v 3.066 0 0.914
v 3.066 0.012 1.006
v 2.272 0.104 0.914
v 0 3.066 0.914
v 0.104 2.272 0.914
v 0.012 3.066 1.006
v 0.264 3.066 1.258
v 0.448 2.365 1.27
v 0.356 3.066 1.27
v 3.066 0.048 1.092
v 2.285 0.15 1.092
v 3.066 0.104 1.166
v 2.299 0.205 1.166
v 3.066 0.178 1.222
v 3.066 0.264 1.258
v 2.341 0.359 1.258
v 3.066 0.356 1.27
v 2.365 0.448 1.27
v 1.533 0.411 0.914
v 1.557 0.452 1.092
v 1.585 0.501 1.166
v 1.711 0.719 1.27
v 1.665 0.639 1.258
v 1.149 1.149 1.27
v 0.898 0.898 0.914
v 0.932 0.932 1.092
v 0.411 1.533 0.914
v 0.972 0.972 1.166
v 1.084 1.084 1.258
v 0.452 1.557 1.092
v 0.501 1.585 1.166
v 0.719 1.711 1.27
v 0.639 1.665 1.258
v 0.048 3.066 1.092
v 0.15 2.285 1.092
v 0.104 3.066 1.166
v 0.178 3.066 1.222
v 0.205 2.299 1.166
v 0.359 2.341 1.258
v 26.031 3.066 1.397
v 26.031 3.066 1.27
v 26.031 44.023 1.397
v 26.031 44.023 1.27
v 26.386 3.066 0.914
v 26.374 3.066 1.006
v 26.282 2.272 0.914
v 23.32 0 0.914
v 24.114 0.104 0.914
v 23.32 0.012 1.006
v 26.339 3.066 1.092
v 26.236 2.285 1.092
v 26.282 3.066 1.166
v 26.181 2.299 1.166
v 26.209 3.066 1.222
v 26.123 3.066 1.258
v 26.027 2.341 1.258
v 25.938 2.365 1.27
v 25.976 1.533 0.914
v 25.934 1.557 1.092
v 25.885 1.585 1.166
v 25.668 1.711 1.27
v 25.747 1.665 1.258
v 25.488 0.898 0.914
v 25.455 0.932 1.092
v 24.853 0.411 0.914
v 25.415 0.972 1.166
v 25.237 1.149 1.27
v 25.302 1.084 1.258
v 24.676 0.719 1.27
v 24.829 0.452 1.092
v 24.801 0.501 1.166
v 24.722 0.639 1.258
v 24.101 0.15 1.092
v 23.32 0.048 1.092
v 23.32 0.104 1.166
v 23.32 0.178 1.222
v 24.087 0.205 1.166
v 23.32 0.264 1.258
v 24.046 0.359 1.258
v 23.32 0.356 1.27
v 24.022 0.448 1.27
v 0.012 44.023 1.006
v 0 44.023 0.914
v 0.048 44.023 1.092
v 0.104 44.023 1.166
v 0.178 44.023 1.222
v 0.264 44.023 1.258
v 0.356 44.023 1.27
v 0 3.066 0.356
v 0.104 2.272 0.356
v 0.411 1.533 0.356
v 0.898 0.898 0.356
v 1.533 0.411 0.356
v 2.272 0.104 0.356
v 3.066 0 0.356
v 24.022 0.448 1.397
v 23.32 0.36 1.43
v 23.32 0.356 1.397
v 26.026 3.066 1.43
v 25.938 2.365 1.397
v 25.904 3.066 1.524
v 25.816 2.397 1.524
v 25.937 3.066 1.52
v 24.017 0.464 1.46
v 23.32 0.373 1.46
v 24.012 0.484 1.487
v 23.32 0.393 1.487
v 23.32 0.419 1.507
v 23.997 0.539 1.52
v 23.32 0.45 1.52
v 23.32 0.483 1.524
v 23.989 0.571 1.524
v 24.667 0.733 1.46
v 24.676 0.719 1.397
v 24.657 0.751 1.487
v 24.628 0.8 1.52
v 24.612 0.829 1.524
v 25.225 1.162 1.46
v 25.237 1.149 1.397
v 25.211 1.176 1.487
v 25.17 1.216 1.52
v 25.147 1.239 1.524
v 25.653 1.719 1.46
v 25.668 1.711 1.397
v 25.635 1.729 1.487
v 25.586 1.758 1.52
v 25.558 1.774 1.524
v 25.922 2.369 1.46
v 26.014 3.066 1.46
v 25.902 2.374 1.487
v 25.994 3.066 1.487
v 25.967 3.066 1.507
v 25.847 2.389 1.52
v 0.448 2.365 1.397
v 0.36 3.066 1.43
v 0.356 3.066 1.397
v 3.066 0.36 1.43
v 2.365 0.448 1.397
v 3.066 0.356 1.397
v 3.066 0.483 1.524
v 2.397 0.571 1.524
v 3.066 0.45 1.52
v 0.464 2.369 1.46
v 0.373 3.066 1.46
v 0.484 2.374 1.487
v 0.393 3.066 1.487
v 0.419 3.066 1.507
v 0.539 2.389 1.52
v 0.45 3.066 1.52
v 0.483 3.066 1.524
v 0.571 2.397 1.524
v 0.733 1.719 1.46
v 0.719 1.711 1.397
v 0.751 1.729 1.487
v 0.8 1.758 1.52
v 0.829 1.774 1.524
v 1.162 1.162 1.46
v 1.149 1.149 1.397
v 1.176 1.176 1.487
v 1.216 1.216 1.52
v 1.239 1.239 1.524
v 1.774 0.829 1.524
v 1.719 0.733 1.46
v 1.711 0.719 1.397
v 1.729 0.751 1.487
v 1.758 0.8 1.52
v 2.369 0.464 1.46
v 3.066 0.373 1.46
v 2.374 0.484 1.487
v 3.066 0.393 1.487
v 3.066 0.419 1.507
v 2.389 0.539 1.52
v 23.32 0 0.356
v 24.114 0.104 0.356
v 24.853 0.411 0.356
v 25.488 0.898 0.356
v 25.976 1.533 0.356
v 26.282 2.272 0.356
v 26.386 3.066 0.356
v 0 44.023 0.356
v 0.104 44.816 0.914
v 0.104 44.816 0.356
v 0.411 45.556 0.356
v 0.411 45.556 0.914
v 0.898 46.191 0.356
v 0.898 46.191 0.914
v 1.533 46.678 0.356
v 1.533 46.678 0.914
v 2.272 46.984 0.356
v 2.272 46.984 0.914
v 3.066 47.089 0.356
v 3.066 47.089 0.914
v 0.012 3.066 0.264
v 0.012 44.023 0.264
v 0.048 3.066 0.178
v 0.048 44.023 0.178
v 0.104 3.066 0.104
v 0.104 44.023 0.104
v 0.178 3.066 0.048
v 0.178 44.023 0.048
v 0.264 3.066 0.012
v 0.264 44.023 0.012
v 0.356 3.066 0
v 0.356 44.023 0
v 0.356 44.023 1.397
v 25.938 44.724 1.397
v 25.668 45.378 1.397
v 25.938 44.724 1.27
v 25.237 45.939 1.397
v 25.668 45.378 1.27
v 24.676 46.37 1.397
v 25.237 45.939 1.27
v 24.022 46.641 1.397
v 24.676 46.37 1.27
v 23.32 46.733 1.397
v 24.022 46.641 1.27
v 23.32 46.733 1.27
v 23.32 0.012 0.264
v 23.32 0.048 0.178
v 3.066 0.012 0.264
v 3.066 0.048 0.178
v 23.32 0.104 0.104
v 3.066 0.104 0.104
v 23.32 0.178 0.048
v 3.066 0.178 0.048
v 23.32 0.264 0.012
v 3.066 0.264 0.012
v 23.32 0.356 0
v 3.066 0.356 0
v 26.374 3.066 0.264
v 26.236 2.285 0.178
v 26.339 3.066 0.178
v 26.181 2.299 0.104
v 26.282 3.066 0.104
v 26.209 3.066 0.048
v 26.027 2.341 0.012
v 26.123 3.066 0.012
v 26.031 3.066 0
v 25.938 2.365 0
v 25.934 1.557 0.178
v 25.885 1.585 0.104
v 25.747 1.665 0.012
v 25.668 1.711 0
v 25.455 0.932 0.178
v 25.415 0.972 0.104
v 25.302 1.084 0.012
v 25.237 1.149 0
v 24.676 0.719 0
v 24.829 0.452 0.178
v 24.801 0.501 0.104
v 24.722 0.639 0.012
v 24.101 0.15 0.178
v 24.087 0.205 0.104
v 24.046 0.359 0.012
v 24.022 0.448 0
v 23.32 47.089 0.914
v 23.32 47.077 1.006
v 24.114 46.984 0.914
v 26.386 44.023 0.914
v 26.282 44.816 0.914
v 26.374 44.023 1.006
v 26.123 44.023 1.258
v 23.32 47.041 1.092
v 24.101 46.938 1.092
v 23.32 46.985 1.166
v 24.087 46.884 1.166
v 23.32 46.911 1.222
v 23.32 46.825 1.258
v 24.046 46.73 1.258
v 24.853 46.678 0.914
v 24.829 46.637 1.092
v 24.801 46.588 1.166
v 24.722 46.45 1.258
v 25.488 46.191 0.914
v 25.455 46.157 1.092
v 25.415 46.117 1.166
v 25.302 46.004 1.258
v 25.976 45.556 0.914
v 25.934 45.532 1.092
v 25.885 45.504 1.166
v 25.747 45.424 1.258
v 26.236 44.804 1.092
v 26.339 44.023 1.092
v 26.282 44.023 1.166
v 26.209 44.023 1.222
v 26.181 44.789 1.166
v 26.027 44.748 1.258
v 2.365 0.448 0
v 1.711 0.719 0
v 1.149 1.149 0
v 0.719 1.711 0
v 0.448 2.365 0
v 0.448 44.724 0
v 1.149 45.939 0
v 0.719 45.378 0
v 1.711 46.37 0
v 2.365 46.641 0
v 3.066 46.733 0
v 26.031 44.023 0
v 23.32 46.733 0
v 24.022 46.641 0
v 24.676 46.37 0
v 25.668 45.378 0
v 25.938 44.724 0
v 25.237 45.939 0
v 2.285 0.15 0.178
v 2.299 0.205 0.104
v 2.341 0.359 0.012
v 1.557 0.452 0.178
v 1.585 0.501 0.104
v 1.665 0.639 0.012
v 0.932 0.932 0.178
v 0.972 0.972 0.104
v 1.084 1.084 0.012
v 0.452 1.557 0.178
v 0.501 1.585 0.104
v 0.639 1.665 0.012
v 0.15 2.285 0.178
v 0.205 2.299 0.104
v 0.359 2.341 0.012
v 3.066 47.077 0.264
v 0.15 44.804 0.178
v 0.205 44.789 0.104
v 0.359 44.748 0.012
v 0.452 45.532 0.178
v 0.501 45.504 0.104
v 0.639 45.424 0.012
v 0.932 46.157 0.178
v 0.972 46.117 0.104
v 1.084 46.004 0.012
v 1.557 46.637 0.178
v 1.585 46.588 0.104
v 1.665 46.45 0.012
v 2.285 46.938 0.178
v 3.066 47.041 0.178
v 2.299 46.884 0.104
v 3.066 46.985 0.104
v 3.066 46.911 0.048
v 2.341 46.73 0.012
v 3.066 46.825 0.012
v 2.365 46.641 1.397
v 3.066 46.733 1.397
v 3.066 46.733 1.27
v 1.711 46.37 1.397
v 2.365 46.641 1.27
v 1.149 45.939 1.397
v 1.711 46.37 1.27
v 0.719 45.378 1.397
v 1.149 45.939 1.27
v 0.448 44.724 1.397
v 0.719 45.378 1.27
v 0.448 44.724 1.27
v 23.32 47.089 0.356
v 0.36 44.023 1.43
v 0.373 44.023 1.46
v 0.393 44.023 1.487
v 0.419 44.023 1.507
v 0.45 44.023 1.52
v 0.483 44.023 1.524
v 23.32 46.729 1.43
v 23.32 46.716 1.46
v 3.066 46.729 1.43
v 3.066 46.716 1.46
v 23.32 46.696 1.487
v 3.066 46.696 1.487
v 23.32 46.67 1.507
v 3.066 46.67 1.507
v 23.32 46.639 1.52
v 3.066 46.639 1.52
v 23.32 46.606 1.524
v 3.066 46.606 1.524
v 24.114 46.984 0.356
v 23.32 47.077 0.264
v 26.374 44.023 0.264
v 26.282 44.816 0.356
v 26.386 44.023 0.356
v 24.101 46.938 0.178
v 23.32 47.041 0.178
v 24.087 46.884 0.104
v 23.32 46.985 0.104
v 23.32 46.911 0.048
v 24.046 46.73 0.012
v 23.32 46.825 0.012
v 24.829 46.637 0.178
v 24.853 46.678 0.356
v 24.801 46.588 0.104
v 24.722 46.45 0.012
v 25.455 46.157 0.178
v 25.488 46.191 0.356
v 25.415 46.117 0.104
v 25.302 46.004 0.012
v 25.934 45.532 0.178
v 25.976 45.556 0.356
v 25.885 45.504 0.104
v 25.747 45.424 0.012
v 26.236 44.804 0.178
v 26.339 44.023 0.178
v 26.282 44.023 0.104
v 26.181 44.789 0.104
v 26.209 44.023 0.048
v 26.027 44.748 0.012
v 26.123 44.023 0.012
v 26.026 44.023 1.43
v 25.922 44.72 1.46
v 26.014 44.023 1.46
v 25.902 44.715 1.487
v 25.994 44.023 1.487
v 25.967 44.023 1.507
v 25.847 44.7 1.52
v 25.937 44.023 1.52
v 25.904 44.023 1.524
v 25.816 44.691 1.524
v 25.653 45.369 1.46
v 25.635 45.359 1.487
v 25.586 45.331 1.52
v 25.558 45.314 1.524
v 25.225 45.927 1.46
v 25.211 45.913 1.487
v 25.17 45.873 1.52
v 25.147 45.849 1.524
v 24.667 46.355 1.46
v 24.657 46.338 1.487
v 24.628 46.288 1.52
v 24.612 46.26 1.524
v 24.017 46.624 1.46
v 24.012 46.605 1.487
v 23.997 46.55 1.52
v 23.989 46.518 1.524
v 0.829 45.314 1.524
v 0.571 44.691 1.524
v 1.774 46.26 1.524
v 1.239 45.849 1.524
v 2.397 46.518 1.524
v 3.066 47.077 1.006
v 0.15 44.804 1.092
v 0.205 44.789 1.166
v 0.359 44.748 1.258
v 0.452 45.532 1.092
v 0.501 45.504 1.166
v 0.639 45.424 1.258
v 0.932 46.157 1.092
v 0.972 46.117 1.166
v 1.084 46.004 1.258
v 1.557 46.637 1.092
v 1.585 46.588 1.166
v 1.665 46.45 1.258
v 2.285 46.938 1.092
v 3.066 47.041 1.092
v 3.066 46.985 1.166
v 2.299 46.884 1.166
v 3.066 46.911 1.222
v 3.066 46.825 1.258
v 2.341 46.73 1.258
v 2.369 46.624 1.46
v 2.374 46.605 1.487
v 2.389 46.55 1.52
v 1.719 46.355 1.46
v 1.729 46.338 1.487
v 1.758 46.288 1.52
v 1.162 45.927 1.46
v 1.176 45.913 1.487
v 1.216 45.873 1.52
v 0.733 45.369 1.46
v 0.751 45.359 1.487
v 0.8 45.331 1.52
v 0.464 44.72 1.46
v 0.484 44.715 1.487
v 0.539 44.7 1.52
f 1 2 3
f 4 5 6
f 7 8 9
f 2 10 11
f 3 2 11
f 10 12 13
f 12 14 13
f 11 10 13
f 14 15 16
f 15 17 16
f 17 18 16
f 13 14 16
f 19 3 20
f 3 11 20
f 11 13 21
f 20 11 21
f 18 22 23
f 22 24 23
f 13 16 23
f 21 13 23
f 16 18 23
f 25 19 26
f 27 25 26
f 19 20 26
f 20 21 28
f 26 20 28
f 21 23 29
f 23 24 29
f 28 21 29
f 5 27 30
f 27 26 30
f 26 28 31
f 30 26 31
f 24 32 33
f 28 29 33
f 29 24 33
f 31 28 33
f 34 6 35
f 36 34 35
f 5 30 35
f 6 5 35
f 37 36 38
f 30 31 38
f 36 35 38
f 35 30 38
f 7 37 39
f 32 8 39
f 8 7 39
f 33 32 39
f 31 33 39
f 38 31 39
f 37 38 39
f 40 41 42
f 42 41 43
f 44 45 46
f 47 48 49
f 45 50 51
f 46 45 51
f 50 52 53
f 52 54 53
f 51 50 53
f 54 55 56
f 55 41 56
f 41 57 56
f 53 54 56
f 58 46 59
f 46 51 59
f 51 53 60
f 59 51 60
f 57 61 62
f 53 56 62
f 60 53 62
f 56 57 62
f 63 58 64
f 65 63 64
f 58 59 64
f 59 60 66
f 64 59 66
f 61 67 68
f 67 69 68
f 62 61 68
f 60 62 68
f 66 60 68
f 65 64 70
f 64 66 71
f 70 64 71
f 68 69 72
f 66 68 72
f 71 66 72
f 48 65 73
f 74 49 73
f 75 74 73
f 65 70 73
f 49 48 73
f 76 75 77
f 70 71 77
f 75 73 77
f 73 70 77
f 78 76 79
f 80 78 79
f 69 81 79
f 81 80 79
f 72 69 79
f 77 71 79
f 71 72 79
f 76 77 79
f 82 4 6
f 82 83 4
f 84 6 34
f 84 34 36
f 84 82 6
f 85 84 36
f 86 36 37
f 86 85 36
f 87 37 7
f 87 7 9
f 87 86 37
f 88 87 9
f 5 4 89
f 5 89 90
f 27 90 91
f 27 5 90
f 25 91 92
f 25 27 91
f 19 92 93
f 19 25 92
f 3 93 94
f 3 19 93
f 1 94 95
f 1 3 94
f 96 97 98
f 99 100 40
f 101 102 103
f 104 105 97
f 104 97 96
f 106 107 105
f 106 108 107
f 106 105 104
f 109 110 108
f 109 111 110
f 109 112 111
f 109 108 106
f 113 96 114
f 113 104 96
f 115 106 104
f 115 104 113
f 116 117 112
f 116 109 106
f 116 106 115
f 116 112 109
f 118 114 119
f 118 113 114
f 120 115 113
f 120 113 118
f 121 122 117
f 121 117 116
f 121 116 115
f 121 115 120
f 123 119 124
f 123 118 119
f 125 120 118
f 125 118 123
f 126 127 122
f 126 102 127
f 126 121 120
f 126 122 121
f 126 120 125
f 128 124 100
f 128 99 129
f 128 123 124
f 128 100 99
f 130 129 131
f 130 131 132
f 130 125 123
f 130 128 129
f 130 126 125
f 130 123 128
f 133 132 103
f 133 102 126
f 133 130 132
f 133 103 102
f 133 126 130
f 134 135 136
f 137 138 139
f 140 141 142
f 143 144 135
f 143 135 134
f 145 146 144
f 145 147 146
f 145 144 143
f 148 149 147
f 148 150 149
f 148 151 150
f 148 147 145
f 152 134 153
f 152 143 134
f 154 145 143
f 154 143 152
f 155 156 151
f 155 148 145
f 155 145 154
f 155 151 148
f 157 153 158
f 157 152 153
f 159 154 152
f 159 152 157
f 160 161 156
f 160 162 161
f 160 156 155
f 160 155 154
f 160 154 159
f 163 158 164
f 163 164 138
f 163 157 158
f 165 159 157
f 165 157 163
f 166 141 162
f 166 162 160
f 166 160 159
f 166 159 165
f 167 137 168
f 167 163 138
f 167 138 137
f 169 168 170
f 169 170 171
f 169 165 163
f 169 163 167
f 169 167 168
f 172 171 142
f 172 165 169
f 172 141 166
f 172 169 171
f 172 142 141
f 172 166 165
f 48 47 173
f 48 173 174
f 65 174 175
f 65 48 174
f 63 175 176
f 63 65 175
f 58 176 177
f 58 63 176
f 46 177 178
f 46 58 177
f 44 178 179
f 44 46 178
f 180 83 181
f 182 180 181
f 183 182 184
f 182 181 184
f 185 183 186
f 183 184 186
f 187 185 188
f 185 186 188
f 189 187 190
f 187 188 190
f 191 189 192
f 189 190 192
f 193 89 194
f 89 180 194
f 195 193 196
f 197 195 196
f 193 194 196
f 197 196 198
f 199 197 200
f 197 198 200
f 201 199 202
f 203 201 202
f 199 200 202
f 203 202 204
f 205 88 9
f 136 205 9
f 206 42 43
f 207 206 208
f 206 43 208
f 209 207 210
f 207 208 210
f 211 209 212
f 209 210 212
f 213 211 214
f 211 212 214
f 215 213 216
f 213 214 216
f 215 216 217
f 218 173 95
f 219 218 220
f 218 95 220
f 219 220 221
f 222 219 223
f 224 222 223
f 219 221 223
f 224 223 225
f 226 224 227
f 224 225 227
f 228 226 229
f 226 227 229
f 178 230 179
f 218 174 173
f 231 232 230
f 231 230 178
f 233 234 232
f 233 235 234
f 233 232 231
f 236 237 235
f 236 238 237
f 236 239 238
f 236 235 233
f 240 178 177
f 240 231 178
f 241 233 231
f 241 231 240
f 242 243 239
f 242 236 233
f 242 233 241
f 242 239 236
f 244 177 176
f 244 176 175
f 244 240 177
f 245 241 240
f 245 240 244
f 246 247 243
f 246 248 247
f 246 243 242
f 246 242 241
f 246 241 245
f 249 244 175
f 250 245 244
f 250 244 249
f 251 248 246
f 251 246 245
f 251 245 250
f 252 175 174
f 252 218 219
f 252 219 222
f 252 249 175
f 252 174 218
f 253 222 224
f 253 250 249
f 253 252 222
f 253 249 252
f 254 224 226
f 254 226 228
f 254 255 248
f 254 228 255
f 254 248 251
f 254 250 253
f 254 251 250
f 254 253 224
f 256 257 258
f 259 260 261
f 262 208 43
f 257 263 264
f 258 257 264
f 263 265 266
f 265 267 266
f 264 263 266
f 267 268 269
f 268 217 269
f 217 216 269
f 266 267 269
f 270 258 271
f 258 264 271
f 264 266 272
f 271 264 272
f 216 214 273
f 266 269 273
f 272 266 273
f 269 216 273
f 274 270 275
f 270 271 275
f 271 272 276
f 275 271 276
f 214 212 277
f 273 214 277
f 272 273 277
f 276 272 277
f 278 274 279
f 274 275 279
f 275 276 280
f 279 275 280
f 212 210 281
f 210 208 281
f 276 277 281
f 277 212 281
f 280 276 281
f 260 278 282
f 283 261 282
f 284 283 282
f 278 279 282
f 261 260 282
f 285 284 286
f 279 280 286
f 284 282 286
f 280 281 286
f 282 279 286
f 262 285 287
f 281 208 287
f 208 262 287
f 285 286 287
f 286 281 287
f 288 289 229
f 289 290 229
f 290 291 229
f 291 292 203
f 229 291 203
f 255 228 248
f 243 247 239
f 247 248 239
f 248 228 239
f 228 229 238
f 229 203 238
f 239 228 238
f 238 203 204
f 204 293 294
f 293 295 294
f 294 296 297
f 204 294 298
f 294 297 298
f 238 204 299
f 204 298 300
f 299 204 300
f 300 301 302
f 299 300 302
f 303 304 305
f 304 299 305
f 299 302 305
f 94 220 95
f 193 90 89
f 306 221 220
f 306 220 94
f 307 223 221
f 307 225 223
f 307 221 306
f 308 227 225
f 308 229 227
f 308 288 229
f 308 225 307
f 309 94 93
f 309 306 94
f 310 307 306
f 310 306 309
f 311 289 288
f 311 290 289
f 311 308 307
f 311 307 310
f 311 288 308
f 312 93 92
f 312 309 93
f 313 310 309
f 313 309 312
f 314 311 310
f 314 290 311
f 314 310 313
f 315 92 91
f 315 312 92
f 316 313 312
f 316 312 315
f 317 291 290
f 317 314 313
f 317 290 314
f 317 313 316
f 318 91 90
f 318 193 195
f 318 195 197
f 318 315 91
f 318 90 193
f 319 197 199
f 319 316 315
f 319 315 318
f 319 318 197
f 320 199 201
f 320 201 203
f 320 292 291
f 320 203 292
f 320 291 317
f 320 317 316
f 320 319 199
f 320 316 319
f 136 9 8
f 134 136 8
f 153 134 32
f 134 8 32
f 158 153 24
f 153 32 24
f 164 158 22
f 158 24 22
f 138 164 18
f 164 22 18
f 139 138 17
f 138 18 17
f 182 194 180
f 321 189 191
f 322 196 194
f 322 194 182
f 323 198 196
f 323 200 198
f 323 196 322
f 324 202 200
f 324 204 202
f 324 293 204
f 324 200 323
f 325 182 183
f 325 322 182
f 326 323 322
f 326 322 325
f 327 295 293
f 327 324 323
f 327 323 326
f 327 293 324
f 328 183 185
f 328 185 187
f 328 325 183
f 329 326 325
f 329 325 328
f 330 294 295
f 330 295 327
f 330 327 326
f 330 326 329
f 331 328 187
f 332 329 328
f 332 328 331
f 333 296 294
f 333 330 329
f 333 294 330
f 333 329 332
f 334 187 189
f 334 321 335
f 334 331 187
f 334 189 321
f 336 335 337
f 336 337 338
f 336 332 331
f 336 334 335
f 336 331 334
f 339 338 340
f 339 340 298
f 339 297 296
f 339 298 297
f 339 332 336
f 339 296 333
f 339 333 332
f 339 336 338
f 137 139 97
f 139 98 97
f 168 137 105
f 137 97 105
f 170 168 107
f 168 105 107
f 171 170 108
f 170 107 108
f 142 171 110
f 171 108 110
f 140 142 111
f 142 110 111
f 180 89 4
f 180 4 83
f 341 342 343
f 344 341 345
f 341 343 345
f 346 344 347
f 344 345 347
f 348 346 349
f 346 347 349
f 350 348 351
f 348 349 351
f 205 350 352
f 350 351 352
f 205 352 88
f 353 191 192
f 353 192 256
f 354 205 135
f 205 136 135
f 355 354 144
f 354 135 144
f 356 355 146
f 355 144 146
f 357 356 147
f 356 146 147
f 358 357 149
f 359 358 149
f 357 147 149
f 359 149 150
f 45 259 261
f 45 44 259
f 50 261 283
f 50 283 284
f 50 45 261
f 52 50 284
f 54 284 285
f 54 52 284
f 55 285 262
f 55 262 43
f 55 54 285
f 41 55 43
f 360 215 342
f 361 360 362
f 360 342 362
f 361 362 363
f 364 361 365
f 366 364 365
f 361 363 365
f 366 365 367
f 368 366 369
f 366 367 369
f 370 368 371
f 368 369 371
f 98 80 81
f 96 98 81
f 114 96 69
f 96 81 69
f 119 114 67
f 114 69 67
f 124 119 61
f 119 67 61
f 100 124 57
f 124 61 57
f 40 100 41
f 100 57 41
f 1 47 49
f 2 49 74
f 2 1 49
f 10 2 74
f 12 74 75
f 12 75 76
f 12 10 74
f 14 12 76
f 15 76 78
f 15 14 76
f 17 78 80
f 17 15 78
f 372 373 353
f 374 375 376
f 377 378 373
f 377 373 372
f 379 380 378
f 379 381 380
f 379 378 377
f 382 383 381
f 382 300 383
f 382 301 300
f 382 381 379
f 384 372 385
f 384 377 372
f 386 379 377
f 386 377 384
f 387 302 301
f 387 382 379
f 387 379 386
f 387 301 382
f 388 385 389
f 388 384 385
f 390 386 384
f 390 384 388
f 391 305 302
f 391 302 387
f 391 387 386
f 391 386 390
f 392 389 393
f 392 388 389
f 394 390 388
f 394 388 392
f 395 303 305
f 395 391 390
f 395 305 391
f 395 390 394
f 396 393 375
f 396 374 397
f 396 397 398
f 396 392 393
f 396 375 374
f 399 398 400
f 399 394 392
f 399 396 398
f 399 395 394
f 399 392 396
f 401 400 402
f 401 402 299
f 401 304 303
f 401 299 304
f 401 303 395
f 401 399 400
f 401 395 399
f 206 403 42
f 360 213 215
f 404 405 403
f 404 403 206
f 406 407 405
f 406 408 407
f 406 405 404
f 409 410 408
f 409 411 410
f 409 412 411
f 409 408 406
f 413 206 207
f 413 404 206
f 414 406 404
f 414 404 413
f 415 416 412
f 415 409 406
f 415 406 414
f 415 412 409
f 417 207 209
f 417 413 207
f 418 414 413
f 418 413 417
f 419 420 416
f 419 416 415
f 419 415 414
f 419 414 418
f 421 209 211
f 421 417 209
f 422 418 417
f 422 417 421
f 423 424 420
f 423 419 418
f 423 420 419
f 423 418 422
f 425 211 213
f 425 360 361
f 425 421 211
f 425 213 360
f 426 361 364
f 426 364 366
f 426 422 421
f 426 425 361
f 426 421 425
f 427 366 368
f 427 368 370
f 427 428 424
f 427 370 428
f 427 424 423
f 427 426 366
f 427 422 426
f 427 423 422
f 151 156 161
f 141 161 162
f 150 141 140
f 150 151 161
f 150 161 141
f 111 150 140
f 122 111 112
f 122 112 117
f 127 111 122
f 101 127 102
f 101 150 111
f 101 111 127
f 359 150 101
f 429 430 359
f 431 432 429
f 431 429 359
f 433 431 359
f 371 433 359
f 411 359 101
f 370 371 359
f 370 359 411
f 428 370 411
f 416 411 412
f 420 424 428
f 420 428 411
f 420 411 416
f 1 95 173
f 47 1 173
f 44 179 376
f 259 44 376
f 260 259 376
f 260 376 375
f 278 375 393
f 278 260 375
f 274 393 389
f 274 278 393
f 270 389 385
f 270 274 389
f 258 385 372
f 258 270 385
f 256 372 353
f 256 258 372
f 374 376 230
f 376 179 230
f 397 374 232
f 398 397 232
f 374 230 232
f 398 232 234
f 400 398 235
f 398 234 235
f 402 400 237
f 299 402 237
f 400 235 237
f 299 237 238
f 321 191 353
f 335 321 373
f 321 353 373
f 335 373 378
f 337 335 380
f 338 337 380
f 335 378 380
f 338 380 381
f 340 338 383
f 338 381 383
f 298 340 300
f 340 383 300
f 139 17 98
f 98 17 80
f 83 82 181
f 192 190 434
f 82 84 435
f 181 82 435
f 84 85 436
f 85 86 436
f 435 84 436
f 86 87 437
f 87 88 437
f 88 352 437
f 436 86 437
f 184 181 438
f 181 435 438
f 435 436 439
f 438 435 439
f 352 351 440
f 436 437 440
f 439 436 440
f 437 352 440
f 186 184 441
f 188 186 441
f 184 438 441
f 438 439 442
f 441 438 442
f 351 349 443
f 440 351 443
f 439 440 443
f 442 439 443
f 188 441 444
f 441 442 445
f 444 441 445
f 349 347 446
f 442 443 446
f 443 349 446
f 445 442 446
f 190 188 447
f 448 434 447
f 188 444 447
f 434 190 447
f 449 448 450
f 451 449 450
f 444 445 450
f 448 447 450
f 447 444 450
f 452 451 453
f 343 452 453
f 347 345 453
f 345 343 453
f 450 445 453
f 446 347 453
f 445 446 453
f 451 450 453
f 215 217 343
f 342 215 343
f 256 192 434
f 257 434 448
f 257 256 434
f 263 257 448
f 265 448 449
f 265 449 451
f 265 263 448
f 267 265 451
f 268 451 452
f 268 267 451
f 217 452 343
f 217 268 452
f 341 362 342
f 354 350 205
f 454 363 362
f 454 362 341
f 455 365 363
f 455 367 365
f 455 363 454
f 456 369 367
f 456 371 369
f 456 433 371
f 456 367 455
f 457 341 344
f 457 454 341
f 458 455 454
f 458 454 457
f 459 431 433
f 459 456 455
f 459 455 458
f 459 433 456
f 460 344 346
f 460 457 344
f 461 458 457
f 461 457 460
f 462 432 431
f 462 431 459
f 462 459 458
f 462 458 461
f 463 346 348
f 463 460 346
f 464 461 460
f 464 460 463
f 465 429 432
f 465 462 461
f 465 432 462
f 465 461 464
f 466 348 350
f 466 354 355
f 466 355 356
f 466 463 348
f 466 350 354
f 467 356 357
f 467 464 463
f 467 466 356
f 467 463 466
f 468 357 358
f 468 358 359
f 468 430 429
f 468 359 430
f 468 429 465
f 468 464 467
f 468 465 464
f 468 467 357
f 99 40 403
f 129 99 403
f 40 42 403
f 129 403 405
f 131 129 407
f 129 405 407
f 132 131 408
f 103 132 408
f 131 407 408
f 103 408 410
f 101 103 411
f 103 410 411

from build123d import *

# Parameters (mm, degrees)
F0_W     = 26.3863261789
F0_H     = 47.0887087286
F1_DEPTH = 1.27
F2_R     = 3.0660512242
F3_R     = 0.3556
F4_R     = 0.3556
F6_DEPTH = 0.254
F7_R     = 0.127


with BuildPart() as f1:
    # F0 (on Top) → F1 (new body)
    with BuildSketch(Plane.XY):
        with Locations((13.1931630895, 23.5443543643)):
            Rectangle(F0_W, F0_H)
    extrude(amount=F1_DEPTH)

    # F2
    f2_edges = [f1.edges().sort_by_distance(p)[0] for p in [
        (26.386326, 47.088709, 0.635),
        (26.386326, 0, 0.635),
        (0, 47.088709, 0.635),
        (0, 0, 0.635),
    ]]
    fillet(f2_edges, radius=F2_R)

    # F3
    f3_edges = [f1.edges().sort_by_distance(p)[0] for p in [
        (0, 23.544354, 0),
        (0.898026, 46.190683, 0),
        (0.898026, 0.898026, 0),
        (13.193163, 47.088709, 0),
        (13.193163, 0, 0),
        (25.488301, 46.190683, 0),
        (25.488301, 0.898026, 0),
        (26.386326, 23.544354, 0),
    ]]
    fillet(f3_edges, radius=F3_R)

    # F4
    f4_edges = [f1.edges().sort_by_distance(p)[0] for p in [
        (0, 23.544354, 1.27),
        (0.898026, 46.190683, 1.27),
        (0.898026, 0.898026, 1.27),
        (13.193163, 47.088709, 1.27),
        (13.193163, 0, 1.27),
        (25.488301, 46.190683, 1.27),
        (25.488301, 0.898026, 1.27),
        (26.386326, 23.544354, 1.27),
    ]]
    fillet(f4_edges, radius=F4_R)

    # F5 (on face) → F6 (join)
    with BuildSketch(Plane.XY.offset(1.27)):
        with BuildLine():
            Line((26.0307261789, 3.0660512242), (26.0307261789, 44.0226575043))
            ThreePointArc((26.0307261789, 44.0226575043), (25.2368533954, 45.9392359451), (23.3202749547, 46.7331087286))
            Line((23.3202749547, 46.7331087286), (3.0660512242, 46.7331087286))
            ThreePointArc((3.0660512242, 46.7331087286), (1.1494727835, 45.9392359451), (0.3556, 44.0226575043))
            Line((0.3556, 44.0226575043), (0.3556, 3.0660512242))
            ThreePointArc((0.3556, 3.0660512242), (1.1494727835, 1.1494727835), (3.0660512242, 0.3556))
            Line((3.0660512242, 0.3556), (23.3202749547, 0.3556))
            ThreePointArc((23.3202749547, 0.3556), (25.2368533954, 1.1494727835), (26.0307261789, 3.0660512242))
        make_face()
    extrude(amount=F6_DEPTH)

    # F7
    f7_edges = [f1.edges().sort_by_distance(p)[0] for p in [
        (26.030726, 23.544354, 1.524),
        (25.236853, 45.939236, 1.524),
        (13.193163, 46.733109, 1.524),
        (1.149473, 45.939236, 1.524),
        (0.3556, 23.544354, 1.524),
        (1.149473, 1.149473, 1.524),
        (13.193163, 0.3556, 1.524),
        (25.236853, 1.149473, 1.524),
    ]]
    fillet(f7_edges, radius=F7_R)


solid = f1.part
